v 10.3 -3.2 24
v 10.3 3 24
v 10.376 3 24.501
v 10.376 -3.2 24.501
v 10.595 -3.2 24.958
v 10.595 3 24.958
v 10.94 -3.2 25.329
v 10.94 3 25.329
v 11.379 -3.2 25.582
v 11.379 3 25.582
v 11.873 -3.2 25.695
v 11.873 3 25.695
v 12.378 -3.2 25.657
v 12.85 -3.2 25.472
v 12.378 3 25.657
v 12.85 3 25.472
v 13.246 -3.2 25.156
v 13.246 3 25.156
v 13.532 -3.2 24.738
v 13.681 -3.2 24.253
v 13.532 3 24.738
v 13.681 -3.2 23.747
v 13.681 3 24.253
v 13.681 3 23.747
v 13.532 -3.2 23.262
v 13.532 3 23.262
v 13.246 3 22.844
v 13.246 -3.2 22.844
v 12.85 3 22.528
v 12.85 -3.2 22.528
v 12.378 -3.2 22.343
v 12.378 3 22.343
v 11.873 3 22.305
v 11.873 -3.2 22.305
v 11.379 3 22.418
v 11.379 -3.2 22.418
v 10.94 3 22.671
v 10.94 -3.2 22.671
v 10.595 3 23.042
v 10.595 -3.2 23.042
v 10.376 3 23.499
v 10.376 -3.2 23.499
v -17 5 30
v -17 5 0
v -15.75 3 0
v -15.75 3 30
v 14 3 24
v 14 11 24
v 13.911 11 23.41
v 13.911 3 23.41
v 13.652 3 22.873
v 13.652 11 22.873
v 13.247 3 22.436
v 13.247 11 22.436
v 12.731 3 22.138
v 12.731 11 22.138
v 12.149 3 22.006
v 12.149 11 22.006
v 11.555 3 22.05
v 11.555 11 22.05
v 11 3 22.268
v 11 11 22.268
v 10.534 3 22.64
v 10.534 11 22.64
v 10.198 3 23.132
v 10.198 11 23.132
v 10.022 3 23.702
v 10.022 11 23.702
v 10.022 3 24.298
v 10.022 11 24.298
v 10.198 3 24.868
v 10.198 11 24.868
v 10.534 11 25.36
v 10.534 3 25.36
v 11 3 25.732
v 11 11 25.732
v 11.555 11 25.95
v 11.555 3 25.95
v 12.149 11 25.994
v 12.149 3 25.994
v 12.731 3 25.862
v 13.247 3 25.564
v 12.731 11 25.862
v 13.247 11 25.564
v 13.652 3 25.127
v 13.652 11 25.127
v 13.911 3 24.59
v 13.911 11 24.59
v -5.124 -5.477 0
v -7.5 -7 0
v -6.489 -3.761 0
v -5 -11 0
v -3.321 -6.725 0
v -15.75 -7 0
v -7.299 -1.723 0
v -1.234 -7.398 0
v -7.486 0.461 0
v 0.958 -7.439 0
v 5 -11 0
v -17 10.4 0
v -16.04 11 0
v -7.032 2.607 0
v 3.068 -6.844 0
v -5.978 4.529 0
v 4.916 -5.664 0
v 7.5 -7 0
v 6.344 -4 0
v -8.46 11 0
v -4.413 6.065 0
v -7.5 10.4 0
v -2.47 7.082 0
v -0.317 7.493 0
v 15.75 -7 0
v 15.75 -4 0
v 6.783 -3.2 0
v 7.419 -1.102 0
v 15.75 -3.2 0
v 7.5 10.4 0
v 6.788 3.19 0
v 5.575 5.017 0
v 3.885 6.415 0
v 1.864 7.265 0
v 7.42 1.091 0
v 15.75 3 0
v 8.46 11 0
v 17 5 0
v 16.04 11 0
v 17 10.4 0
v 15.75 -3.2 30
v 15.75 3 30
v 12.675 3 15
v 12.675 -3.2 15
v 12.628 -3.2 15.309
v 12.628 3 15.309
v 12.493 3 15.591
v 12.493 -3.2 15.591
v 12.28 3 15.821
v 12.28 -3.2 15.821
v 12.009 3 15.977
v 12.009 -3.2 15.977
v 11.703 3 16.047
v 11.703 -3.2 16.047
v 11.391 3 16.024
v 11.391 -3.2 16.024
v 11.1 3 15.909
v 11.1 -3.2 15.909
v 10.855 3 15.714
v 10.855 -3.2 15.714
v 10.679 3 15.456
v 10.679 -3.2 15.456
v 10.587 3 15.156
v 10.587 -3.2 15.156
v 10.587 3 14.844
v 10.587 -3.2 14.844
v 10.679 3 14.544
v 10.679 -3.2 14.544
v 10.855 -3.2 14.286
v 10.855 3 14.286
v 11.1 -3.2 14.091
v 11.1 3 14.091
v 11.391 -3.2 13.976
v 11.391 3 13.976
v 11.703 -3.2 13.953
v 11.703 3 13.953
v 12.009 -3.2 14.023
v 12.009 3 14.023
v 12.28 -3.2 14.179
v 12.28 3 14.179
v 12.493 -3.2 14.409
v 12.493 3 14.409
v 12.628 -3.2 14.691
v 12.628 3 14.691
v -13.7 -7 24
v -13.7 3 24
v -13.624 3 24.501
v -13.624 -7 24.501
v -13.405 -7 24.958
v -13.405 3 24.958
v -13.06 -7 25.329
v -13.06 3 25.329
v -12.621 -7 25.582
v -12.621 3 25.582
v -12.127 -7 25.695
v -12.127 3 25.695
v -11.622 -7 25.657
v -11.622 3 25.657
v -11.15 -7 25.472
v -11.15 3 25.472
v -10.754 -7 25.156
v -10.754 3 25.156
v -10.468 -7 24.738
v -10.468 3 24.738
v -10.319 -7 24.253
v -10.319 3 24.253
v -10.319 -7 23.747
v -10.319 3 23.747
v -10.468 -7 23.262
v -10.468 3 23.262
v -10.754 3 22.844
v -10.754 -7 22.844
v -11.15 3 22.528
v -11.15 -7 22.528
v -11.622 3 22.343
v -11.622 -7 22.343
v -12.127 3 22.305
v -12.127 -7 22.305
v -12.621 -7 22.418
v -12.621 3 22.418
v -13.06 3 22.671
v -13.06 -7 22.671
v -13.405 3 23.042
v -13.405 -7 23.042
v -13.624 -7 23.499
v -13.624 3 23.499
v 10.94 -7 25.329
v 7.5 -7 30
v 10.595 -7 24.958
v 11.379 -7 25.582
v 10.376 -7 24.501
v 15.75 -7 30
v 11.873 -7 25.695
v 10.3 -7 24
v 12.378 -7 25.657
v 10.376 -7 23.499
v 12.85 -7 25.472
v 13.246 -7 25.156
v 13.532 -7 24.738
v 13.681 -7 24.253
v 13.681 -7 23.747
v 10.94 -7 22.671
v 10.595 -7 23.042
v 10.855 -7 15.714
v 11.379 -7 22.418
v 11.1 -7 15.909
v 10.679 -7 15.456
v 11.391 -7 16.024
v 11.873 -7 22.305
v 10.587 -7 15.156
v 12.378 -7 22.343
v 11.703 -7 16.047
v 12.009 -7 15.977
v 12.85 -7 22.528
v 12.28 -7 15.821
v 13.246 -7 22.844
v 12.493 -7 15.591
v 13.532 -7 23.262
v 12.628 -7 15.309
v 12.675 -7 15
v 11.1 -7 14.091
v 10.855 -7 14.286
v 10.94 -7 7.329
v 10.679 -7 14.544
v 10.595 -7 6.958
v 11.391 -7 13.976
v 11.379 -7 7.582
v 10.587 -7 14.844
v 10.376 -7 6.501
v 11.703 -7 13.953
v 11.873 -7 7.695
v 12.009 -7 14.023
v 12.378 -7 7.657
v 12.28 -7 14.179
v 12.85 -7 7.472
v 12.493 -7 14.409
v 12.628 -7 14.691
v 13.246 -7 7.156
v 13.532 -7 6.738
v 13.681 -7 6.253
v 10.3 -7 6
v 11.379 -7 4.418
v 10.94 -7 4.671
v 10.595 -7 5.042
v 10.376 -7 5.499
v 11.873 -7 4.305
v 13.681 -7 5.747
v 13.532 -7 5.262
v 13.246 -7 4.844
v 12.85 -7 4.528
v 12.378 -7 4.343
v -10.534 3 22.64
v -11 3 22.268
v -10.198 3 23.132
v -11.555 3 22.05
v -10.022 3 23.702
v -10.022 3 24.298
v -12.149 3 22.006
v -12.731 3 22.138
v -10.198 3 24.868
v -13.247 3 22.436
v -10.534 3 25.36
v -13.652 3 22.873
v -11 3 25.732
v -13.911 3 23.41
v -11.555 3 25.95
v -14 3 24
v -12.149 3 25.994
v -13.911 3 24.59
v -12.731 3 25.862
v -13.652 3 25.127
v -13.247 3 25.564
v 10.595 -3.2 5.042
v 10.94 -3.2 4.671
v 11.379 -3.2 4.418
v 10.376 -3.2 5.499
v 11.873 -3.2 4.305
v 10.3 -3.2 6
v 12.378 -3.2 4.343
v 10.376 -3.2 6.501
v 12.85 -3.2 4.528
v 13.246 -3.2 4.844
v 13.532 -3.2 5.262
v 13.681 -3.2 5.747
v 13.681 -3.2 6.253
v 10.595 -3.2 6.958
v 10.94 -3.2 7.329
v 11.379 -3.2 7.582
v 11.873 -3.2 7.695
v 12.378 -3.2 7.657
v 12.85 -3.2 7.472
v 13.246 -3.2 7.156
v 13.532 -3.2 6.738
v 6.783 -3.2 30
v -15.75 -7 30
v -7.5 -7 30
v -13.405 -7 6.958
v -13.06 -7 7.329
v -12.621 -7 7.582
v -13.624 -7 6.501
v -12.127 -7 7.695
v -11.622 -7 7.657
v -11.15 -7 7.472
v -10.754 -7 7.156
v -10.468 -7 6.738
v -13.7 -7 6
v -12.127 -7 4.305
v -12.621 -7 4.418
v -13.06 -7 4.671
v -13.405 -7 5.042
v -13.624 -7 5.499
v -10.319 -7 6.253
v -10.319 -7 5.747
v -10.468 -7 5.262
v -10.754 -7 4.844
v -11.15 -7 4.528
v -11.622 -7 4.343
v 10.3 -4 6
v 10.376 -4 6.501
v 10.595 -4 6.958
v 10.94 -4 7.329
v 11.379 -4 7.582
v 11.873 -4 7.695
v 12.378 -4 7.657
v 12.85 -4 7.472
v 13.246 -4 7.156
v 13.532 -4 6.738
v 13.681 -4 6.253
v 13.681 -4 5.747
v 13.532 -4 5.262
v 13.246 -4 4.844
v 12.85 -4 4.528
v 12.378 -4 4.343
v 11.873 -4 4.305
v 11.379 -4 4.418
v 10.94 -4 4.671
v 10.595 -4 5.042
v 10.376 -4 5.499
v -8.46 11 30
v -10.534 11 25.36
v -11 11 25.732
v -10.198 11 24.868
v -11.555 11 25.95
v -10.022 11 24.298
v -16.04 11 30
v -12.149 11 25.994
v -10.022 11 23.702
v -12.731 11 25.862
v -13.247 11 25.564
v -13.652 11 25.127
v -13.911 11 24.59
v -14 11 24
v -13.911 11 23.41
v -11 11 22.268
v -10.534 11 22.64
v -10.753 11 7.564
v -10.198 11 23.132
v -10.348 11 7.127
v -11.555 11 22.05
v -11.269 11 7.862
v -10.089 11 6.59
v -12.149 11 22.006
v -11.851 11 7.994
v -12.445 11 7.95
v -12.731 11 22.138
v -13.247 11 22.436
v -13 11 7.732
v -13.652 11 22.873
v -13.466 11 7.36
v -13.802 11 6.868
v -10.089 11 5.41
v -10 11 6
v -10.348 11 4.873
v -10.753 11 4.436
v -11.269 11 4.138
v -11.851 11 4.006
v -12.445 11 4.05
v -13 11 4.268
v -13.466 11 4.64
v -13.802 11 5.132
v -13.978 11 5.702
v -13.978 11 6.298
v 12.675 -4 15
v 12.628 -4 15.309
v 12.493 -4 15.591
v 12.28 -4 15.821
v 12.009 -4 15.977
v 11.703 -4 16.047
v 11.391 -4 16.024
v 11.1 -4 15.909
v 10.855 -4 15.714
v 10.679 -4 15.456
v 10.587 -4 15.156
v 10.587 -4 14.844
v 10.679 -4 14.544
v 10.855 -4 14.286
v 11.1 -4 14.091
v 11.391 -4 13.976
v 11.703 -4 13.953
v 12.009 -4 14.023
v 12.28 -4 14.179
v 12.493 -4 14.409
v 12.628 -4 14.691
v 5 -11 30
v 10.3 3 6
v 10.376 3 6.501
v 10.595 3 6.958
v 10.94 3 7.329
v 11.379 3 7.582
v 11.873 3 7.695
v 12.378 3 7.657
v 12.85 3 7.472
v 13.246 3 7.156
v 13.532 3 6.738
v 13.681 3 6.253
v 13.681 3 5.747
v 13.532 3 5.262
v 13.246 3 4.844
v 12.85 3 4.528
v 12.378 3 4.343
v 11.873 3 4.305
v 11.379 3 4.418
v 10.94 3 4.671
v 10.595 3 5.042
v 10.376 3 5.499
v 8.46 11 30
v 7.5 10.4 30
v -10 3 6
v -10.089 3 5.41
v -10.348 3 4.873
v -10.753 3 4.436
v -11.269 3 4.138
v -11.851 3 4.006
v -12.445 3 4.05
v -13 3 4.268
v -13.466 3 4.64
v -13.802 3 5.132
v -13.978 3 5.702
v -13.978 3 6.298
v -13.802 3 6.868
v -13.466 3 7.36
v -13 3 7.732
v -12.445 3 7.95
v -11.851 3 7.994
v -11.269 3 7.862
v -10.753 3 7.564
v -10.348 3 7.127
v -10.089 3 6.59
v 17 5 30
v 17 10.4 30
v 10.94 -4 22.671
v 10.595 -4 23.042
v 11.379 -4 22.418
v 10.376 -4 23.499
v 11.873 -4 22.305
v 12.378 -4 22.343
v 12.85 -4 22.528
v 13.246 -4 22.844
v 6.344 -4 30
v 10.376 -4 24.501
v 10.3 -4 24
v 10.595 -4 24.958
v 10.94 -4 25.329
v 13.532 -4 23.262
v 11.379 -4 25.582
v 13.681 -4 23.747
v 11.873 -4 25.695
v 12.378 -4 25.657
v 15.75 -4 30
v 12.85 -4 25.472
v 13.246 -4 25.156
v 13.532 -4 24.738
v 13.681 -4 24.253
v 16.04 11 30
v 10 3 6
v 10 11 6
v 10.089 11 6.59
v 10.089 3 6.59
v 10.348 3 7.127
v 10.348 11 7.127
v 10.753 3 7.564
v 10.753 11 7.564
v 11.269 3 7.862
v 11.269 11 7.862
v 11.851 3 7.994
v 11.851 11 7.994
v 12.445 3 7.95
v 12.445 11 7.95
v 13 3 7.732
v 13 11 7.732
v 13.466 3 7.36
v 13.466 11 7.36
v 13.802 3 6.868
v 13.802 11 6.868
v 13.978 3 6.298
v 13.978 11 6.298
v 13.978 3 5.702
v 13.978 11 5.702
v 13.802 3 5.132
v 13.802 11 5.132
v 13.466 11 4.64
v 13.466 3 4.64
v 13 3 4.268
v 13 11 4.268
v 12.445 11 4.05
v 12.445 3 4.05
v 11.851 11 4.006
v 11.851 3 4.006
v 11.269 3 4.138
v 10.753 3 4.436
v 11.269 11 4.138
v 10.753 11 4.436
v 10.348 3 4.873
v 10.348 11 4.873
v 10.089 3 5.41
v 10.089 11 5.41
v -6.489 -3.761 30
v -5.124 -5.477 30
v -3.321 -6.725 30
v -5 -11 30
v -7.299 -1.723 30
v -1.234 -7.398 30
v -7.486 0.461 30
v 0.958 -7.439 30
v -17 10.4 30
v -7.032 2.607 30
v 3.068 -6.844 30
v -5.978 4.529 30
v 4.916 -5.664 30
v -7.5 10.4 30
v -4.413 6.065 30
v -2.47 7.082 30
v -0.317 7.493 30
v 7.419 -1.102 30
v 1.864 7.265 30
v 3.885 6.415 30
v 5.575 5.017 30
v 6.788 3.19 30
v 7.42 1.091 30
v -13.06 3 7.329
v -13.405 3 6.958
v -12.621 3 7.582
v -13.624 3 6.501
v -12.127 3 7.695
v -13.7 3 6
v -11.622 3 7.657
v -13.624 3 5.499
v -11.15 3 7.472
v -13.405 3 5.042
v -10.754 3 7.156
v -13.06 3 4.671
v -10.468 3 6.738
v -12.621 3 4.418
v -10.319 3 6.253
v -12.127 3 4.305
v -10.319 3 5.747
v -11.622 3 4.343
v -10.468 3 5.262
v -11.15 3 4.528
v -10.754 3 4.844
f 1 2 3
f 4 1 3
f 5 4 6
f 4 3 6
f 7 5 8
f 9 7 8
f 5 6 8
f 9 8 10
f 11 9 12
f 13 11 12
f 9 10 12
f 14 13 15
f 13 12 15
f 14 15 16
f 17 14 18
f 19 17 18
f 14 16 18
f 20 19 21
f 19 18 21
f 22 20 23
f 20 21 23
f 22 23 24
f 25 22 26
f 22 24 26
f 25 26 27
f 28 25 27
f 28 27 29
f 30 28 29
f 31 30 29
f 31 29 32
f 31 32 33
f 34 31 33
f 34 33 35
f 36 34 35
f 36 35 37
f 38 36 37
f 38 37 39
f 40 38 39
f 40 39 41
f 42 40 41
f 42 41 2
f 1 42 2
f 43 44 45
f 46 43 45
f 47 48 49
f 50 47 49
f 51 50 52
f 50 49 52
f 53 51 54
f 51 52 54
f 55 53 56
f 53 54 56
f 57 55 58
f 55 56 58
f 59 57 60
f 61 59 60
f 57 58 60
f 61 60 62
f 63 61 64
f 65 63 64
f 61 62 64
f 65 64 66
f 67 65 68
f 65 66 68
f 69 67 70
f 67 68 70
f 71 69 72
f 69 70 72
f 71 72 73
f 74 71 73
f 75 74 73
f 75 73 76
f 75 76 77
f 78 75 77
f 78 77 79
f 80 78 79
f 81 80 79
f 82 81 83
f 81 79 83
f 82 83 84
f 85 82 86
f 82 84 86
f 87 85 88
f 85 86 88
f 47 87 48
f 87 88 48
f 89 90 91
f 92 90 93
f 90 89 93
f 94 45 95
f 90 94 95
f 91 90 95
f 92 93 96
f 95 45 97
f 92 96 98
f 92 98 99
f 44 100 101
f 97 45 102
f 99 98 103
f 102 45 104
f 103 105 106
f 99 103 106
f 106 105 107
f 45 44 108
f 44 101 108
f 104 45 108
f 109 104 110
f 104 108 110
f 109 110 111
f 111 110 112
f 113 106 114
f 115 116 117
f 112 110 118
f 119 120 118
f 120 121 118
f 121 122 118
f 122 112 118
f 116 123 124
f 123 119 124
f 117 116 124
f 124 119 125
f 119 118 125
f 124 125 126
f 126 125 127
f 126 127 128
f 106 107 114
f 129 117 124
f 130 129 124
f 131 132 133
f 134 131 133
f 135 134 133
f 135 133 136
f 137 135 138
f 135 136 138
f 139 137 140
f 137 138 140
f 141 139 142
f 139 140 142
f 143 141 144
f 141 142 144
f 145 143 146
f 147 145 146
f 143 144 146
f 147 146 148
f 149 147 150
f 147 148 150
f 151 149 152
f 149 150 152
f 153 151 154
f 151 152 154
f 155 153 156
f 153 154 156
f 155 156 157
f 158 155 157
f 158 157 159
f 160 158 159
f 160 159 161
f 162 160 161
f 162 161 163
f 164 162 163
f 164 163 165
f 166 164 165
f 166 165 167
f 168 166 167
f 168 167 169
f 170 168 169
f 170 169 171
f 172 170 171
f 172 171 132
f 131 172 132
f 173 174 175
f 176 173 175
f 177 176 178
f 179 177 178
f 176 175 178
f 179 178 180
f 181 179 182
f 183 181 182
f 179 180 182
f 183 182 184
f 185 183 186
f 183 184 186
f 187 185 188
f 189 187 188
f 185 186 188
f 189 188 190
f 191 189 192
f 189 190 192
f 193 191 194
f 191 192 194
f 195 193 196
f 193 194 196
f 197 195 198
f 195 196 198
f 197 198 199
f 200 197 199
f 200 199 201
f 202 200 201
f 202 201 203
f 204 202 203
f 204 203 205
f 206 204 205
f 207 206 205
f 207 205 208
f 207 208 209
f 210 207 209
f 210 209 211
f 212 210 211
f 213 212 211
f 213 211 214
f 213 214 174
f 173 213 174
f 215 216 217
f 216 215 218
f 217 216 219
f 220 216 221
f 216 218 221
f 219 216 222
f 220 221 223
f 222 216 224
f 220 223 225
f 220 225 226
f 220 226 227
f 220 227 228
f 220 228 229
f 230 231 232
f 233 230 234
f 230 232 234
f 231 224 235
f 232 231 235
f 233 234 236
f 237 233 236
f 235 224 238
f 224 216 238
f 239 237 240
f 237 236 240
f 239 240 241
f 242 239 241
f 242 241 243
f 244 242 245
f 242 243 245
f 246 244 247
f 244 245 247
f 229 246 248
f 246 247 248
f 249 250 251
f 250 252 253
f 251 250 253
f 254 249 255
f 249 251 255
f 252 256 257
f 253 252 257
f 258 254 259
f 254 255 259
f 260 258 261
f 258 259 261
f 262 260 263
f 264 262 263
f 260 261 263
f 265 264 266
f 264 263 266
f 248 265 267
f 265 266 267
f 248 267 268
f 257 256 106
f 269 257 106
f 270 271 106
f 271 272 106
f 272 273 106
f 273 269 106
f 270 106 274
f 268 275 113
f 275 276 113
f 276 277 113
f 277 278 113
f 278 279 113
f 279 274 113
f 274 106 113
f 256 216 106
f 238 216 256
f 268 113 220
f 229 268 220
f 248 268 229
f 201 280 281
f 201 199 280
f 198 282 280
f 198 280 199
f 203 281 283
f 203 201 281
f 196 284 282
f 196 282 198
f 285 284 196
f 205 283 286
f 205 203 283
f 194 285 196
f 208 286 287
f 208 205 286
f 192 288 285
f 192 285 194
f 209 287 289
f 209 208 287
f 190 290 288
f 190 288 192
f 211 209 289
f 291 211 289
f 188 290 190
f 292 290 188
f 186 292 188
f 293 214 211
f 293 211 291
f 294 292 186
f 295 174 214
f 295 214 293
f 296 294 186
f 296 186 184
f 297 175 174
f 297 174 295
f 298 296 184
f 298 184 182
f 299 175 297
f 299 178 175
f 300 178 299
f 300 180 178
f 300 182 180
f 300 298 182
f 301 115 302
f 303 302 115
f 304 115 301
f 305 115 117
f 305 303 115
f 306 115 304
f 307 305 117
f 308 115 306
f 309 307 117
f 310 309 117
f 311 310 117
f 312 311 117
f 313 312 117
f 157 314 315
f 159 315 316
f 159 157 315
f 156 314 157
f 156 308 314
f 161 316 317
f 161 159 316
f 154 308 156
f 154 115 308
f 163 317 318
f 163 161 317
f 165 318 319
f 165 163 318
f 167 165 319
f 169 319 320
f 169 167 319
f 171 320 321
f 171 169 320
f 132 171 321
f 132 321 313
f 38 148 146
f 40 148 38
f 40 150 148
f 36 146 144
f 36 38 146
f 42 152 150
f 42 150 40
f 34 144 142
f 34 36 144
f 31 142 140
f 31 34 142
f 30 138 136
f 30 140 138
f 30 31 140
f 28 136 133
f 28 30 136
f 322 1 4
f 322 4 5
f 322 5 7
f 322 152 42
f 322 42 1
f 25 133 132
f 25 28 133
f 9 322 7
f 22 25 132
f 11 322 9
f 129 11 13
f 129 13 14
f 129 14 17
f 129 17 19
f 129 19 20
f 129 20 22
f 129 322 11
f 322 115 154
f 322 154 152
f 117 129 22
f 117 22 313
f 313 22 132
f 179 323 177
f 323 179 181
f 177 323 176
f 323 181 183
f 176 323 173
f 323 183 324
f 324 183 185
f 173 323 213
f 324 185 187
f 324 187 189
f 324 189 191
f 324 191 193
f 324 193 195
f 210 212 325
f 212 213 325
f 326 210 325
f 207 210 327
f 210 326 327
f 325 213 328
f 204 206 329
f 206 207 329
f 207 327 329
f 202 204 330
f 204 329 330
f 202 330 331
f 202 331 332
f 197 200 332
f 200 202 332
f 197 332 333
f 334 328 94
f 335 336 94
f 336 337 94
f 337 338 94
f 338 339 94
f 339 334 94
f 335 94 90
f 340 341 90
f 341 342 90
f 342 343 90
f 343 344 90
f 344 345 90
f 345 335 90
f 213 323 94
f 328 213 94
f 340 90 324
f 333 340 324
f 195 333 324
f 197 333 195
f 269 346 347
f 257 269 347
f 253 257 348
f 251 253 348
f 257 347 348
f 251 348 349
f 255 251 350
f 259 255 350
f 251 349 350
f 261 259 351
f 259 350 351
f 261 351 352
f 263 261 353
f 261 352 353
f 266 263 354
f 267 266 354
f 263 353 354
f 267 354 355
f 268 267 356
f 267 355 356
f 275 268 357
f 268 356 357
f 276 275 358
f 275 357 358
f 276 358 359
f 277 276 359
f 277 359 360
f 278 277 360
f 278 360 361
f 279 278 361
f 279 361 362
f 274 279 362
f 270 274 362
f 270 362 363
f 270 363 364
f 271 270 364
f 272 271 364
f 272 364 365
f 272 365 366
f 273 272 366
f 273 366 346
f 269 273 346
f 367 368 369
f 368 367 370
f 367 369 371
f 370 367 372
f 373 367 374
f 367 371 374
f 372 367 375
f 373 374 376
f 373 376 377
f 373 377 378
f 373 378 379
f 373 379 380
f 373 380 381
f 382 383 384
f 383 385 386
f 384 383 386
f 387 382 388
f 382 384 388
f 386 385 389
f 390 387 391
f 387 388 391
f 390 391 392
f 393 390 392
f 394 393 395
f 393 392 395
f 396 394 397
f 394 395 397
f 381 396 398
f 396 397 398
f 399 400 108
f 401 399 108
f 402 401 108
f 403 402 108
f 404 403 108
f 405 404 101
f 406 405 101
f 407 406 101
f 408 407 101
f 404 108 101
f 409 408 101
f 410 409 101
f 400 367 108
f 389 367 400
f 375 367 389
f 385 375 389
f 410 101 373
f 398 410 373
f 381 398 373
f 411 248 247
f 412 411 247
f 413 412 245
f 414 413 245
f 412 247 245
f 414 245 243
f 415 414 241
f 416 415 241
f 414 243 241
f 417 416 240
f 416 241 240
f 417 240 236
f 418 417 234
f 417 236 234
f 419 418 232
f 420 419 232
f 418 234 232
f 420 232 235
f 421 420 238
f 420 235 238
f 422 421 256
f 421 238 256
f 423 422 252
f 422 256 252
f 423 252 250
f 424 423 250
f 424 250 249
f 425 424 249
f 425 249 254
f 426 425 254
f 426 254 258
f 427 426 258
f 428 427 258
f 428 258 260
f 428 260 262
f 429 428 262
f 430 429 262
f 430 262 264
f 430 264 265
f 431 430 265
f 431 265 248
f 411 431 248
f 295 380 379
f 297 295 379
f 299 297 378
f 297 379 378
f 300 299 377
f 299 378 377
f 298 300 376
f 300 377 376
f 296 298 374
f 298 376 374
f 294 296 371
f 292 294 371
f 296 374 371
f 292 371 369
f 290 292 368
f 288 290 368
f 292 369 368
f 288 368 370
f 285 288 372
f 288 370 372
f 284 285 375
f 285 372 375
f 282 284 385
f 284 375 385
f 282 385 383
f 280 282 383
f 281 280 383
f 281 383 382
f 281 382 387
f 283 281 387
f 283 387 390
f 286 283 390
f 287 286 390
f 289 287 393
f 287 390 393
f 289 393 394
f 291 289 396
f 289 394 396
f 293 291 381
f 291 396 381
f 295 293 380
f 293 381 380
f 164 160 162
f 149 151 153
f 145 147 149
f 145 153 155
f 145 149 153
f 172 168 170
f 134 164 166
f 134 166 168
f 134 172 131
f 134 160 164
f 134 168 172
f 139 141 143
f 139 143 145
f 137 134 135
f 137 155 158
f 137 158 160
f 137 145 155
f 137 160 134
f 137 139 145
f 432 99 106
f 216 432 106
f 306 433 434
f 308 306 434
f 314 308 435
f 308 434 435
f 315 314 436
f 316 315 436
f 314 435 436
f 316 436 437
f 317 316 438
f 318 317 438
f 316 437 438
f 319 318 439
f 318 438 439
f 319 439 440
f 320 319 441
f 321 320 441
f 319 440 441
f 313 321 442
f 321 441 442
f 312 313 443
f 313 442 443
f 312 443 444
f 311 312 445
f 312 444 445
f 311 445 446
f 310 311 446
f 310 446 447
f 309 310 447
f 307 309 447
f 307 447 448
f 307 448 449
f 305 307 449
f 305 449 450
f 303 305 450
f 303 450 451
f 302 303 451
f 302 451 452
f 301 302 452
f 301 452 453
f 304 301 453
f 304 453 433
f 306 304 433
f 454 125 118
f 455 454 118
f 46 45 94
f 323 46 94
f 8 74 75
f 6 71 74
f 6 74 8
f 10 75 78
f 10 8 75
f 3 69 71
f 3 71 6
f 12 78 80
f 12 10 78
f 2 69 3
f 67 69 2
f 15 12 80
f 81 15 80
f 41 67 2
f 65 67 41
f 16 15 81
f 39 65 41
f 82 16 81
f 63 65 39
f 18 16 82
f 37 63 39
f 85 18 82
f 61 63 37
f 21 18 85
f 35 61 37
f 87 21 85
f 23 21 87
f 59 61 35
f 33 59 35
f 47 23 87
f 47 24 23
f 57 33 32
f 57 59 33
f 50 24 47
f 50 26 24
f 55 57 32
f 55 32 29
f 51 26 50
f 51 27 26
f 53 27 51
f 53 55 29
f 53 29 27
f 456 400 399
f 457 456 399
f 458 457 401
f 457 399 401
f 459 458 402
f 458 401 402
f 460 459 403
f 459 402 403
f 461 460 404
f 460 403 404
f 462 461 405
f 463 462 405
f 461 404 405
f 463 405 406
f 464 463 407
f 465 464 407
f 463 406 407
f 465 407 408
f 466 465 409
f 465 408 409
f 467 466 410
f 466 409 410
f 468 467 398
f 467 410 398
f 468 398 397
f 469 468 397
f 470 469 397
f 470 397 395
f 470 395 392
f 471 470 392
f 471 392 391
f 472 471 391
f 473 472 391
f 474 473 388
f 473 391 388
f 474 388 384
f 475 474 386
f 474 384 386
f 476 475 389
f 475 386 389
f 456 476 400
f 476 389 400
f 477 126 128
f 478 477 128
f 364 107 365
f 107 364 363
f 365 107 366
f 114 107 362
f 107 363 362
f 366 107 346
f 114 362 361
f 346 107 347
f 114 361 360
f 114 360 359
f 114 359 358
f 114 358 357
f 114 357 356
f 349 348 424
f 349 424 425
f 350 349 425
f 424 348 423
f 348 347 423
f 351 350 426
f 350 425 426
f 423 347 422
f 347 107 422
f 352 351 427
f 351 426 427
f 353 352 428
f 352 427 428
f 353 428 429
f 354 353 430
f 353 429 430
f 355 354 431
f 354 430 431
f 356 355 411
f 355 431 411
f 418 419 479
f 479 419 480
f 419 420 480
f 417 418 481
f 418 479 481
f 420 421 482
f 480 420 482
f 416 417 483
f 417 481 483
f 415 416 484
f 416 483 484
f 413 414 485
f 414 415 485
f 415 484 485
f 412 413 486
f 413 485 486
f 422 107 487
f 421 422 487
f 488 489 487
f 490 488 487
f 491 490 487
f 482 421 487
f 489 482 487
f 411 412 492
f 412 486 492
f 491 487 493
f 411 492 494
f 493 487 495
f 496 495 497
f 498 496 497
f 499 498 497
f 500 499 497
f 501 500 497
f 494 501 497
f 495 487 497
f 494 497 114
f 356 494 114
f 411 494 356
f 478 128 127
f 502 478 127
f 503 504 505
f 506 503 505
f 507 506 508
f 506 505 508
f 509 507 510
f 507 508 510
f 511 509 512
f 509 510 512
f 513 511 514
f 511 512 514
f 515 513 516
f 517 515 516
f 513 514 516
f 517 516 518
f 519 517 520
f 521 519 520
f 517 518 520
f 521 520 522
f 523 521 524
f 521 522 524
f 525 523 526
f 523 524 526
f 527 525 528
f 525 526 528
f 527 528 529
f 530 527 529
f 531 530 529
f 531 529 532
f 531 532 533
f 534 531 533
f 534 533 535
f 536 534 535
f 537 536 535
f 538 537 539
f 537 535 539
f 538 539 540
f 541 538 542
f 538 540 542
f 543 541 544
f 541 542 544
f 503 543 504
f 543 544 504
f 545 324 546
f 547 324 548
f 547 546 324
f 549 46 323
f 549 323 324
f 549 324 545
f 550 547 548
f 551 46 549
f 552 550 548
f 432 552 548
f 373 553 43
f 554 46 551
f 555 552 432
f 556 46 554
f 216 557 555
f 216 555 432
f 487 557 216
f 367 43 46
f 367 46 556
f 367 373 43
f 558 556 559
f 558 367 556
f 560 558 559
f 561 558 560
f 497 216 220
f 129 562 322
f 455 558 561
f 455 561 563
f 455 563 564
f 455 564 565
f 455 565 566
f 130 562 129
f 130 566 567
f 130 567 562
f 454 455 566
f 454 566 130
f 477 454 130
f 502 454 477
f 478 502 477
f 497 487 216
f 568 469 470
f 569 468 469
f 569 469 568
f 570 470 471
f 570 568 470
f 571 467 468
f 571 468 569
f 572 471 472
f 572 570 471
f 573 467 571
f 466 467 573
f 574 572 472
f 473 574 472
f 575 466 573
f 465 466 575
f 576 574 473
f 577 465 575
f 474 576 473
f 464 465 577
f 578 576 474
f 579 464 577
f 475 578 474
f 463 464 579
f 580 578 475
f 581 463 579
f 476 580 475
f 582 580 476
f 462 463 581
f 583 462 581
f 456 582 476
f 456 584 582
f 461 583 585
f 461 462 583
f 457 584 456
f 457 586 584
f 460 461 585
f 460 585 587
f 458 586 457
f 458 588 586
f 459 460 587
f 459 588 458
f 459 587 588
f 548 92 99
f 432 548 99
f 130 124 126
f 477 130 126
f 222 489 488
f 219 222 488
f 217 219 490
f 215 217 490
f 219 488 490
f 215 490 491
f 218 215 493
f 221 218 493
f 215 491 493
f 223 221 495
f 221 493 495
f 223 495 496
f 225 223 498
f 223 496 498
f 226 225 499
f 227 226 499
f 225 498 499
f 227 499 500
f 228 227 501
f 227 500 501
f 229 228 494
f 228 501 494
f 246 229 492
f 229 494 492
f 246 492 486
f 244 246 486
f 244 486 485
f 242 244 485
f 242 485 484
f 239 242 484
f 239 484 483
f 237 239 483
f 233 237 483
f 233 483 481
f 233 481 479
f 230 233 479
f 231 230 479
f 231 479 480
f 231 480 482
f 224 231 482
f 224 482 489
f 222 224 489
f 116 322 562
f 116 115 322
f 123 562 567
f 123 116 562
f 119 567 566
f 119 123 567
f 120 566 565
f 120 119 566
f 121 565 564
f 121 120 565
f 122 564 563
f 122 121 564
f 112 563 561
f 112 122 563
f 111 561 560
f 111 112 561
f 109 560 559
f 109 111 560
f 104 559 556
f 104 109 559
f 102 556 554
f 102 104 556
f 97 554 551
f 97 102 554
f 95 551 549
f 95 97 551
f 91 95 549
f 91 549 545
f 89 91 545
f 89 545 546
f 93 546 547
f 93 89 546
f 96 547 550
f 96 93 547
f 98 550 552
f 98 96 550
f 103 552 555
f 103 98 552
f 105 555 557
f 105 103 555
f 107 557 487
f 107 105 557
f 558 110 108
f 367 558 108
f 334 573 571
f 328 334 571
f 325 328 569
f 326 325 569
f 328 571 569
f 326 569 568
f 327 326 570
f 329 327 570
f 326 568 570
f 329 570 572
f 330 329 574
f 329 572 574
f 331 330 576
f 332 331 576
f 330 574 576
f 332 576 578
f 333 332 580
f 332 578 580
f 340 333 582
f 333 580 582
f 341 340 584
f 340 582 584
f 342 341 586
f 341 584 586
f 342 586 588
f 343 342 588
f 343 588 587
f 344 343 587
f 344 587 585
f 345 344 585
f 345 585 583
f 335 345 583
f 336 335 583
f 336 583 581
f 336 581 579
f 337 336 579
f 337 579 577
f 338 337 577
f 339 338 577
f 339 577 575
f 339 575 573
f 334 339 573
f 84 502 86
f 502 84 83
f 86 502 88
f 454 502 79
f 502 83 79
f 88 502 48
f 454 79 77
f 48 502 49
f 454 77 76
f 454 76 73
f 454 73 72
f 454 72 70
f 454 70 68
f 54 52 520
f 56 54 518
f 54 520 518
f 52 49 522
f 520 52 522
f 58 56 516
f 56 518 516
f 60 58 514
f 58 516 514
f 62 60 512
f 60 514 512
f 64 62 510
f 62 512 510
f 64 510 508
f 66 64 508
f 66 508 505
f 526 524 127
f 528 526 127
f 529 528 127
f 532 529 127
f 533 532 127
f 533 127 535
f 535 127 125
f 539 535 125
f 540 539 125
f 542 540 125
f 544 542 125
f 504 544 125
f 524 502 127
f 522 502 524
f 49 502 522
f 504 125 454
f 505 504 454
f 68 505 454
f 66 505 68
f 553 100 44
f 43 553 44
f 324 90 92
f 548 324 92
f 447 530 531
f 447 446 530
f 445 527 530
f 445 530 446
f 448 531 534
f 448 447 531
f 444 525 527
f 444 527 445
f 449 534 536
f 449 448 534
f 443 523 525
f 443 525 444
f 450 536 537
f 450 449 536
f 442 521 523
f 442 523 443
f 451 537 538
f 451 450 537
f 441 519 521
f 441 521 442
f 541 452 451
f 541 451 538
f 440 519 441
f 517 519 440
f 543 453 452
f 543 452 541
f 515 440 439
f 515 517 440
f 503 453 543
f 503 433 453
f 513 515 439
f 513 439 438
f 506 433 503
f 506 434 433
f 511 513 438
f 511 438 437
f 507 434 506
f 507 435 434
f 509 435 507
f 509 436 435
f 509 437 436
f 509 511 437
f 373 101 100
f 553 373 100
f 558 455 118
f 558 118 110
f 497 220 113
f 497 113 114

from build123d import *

# Parameters (mm, degrees)
CROQUIS1_R              = 7.5
SALIENTE_EXTRUIR1_DEPTH = 30
CROQUIS2_W              = 12
CROQUIS2_H              = 0.8
CORTAR_EXTRUIR1_DEPTH   = 37.193922142
CROQUIS3_R              = 1.05
CORTAR_EXTRUIR2_DEPTH   = 10
CROQUIS4_R              = 1.7
CORTAR_EXTRUIR3_DEPTH   = 41.902322672
CROQUIS5_R              = 2
CORTAR_EXTRUIR4_DEPTH   = 8


with BuildPart() as part:
    # Croquis1 → Saliente-Extruir1 (new body)
    with BuildSketch(Plane.XY):
        Polygon((-5, -11), (5, -11), (7.5, -7), (15.75, -7), (15.75, 3), (17, 5), (17, 10.4), (16.04, 11), (8.46, 11), (7.5, 10.4), (-7.5, 10.4), (-8.46, 11), (-16.04, 11), (-17, 10.4), (-17, 5), (-15.75, 3), (-15.75, -7), (-7.5, -7), align=None)
        Circle(CROQUIS1_R, mode=Mode.SUBTRACT)
    extrude(amount=SALIENTE_EXTRUIR1_DEPTH)

    # Croquis2 → Cortar-Extruir1 (cut, through all)
    with BuildSketch(Plane.XY.offset(30)):
        with Locations((11, -3.6)):
            Rectangle(CROQUIS2_W, CROQUIS2_H)
    extrude(amount=-CORTAR_EXTRUIR1_DEPTH, mode=Mode.SUBTRACT)

    # Croquis3 → Cortar-Extruir2 (cut)
    with BuildSketch(Plane.XZ.offset(7)):
        with Locations((11.625, 15)):
            Circle(CROQUIS3_R)
    extrude(amount=-CORTAR_EXTRUIR2_DEPTH, mode=Mode.SUBTRACT)

    # Croquis4 → Cortar-Extruir3 (cut, through all)
    with BuildSketch(Plane(origin=(0, 11, 0), x_dir=(1, 0, 0), z_dir=(0, 1, 0))):
        with Locations(Location((12, -6, 0), (0, 0, 180))):
            Circle(CROQUIS4_R)
        with Locations(Location((-12, -6, 0), (0, 0, 180))):
            Circle(CROQUIS4_R)
        with Locations(Location((-12, -24, 0), (0, 0, 180))):
            Circle(CROQUIS4_R)
        with Locations(Location((12, -24, 0), (0, 0, 180))):
            Circle(CROQUIS4_R)
    extrude(amount=-CORTAR_EXTRUIR3_DEPTH, mode=Mode.SUBTRACT)

    # Croquis5 → Cortar-Extruir4 (cut)
    with BuildSketch(Plane(origin=(0, 11, 0), x_dir=(1, 0, 0), z_dir=(0, 1, 0))):
        with Locations(Location((12, -6, 0), (0, 0, 180))):
            Circle(CROQUIS5_R)
        with Locations((-12, -6)):
            Circle(CROQUIS5_R)
        with Locations(Location((-12, -24, 0), (0, 0, 180))):
            Circle(CROQUIS5_R)
        with Locations((12, -24)):
            Circle(CROQUIS5_R)
    extrude(amount=-CORTAR_EXTRUIR4_DEPTH, mode=Mode.SUBTRACT)


solid = part.part
